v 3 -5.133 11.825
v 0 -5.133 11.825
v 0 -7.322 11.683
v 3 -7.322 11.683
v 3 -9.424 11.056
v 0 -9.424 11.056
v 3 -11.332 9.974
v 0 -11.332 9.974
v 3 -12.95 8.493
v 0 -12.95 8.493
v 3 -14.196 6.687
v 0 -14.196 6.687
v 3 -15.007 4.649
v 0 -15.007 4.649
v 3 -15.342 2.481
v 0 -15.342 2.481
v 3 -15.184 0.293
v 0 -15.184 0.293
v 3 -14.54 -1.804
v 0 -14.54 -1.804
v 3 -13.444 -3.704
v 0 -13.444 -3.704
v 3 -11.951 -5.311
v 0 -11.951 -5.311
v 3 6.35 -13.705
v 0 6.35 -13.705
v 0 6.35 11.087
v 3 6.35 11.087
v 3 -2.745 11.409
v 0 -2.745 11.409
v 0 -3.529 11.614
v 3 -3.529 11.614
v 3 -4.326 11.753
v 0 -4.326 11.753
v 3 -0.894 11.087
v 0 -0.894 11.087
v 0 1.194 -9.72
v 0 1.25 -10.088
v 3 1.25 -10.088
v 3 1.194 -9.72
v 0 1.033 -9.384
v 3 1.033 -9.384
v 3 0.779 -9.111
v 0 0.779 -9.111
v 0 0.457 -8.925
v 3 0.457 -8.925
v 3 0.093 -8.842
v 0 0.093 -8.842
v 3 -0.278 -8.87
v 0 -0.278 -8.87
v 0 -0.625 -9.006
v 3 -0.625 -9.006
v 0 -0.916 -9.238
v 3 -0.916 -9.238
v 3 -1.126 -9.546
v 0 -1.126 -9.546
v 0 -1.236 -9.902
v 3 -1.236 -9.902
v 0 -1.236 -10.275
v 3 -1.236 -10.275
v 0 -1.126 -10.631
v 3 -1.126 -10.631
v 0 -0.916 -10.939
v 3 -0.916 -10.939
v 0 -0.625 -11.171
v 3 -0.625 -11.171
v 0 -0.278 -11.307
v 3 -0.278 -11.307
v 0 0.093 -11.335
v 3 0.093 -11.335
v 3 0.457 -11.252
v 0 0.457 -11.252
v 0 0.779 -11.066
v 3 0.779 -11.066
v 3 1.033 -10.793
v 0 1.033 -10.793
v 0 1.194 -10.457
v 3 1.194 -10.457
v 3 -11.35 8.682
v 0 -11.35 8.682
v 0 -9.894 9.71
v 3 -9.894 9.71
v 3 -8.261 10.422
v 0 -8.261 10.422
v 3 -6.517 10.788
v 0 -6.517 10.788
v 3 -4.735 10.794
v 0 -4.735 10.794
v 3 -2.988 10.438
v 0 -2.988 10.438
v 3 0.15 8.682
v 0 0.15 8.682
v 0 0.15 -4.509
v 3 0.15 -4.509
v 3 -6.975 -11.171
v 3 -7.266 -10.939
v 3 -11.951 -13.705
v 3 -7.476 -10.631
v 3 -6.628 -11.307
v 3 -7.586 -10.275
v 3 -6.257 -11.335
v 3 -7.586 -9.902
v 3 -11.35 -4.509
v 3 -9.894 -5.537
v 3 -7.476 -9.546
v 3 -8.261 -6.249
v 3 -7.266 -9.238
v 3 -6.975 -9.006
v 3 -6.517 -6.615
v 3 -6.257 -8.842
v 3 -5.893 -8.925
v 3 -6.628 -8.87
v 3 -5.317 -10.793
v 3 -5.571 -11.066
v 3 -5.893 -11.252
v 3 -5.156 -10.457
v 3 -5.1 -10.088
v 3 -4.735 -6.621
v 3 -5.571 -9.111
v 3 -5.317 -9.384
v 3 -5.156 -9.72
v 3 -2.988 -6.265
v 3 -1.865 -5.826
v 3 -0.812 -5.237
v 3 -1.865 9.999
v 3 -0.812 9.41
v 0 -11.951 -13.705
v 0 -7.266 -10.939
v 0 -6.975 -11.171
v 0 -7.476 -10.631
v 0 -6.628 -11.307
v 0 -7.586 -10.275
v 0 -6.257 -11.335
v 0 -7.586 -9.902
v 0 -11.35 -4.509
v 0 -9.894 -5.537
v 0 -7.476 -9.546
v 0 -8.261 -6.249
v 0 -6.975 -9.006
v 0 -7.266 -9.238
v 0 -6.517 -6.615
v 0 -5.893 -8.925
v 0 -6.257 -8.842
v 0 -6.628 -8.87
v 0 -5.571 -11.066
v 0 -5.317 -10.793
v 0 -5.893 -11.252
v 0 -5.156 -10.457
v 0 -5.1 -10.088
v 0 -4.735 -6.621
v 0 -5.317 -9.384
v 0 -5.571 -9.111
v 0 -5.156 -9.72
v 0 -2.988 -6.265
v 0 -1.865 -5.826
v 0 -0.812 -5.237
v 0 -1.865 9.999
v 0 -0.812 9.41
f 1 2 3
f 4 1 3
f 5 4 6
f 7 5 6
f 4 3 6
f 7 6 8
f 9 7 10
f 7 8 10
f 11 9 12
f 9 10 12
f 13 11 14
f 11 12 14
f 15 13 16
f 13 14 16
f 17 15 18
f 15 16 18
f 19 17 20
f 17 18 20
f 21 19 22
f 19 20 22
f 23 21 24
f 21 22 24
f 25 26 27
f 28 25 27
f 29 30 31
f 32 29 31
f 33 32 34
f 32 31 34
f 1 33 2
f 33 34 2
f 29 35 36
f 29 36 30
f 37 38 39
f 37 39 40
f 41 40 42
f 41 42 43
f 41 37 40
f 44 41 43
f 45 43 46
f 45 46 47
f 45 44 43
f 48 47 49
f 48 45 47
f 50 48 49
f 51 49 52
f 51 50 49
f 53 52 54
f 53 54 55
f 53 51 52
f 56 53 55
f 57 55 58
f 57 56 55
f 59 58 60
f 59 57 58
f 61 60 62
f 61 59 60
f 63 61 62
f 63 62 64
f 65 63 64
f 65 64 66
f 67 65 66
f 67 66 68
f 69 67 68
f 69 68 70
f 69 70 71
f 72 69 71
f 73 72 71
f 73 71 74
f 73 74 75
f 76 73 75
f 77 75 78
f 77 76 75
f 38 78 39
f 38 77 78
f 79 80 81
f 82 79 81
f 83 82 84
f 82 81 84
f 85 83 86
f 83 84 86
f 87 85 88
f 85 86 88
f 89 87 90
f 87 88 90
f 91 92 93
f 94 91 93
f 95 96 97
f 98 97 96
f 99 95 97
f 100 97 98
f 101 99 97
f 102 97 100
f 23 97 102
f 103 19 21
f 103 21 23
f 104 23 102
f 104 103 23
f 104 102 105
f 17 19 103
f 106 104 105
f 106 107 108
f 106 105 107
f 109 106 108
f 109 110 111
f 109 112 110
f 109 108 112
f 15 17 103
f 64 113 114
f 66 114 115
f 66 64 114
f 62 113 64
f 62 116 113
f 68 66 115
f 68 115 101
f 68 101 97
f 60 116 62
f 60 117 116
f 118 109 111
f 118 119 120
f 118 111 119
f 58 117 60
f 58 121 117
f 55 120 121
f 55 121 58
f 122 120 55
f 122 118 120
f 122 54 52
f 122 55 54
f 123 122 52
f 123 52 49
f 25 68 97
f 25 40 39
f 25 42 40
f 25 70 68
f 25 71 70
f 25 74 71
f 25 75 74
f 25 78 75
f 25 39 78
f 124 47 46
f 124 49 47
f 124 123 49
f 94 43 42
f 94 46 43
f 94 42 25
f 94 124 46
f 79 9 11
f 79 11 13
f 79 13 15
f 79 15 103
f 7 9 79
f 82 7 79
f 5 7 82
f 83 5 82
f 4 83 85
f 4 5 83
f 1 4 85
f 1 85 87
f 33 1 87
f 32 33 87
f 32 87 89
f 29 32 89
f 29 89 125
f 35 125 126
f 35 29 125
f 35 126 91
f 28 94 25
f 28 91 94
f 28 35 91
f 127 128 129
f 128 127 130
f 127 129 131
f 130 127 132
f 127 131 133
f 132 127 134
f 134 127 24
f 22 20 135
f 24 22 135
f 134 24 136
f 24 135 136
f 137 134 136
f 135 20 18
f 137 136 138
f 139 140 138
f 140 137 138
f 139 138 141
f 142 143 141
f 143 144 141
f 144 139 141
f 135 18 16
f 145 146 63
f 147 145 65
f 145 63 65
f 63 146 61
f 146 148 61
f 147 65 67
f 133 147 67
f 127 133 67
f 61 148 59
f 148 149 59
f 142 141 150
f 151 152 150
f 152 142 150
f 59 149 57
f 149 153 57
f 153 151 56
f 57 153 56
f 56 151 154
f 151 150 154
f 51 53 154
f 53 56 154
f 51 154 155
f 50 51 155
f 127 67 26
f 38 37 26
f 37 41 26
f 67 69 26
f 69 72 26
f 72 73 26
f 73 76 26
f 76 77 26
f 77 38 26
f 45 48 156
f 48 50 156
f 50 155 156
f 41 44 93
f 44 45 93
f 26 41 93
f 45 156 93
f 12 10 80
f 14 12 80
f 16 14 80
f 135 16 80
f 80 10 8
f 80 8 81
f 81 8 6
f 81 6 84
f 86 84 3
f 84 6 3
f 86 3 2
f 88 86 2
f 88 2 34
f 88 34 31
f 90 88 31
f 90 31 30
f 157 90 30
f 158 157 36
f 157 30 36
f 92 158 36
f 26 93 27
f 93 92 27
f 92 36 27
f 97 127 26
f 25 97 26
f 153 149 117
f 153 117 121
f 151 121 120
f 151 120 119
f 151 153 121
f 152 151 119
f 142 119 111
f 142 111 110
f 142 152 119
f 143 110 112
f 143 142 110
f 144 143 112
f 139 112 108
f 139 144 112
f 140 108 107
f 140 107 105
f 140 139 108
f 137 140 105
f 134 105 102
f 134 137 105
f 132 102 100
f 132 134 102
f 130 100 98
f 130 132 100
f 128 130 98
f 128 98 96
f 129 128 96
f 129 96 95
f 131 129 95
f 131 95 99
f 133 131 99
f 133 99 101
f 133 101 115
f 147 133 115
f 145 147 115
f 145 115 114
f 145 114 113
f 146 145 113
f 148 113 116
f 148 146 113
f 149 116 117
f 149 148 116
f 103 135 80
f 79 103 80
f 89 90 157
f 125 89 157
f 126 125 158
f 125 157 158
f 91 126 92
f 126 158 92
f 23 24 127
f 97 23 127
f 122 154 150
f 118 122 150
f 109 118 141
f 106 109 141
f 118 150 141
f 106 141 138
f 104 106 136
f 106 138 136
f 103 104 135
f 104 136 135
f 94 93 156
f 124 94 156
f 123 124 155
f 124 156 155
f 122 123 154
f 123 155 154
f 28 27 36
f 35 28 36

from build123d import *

# Parameters (mm, degrees)
F0_R     = 1.25
F1_DEPTH = 3


with BuildPart() as f1:
    # F0 (on Right) → F1 (new body)
    with BuildSketch(Plane.YZ):
        with BuildLine():
            Line((-11.9511362031, -5.3111244172), (-11.9511362031, -13.7053132072))
            Line((-11.9511362031, -13.7053132072), (6.35, -13.7053132072))
            Line((6.35, -13.7053132072), (6.35, -6.9134512067))
            Line((6.35, -6.9134512067), (-0.8936743198, -6.9134512067))
            Line((-0.8936743198, -6.9134512067), (-2.7451495133, -7.2361294001))
            ThreePointArc((-2.7451495133, -7.2361294001), (-3.9259868399, -7.5186674947), (-5.1327843279, -7.6522503891))
            ThreePointArc((-5.1327843279, -7.6522503891), (-8.7662829798, -7.1350102989), (-11.9511362031, -5.3111244172))
        make_face()
        with Locations((-6.35, -10.0884512067)):
            Circle(F0_R, mode=Mode.SUBTRACT)
        with Locations((0, -10.0884512067)):
            Circle(F0_R, mode=Mode.SUBTRACT)
        with BuildLine():
            ThreePointArc((-5.1327843279, 11.8253479758), (-14.6592384736, 5.6910873598), (-11.9511362031, -5.3111244172))
            ThreePointArc((-11.9511362031, -5.3111244172), (-8.7662829798, -7.1350102989), (-5.1327843279, -7.6522503891))
            Line((-5.1327843279, -7.6522503891), (-2.7451495133, -7.2361294001))
            ThreePointArc((-2.7451495133, -7.2361294001), (-1.3343098737, -6.6807990238), (-0.0266257976, -5.9134512067))
            Line((-0.0266257976, -5.9134512067), (-2.9884921599, -6.2646503302))
            ThreePointArc((-2.9884921599, -6.2646503302), (-7.3981085591, -6.4767044208), (-11.35, -4.5089041858))
            ThreePointArc((-11.35, -4.5089041858), (-14.35, 2.0865487933), (-11.35, 8.6820017725))
            ThreePointArc((-11.35, 8.6820017725), (-7.3981085591, 10.6498020075), (-2.9884921599, 10.4377479169))
            Line((-2.9884921599, 10.4377479169), (-0.0266257976, 10.0865487933))
            ThreePointArc((-0.0266257976, 10.0865487933), (-1.3343098737, 10.8538966105), (-2.7451495133, 11.4092269868))
            Line((-2.7451495133, 11.4092269868), (-5.1327843279, 11.8253479758))
        make_face()
        with BuildLine():
            ThreePointArc((-2.7451495133, 11.4092269868), (-3.9259868399, 11.6917650813), (-5.1327843279, 11.8253479758))
            Line((-5.1327843279, 11.8253479758), (-2.7451495133, 11.4092269868))
        make_face()
        with BuildLine():
            Line((-0.8936743198, -6.9134512067), (6.35, -6.9134512067))
            Line((6.35, -6.9134512067), (6.35, -3.945808849))
            Line((6.35, -3.945808849), (5.35, -3.945808849))
            Line((5.35, -3.945808849), (5.35, -5.9134512067))
            Line((5.35, -5.9134512067), (-0.0266257976, -5.9134512067))
            ThreePointArc((-0.0266257976, -5.9134512067), (-1.3343098737, -6.6807990238), (-2.7451495133, -7.2361294001))
            Line((-2.7451495133, -7.2361294001), (-0.8936743198, -6.9134512067))
        make_face()
        with BuildLine():
            Line((-0.8936743198, 11.0865487933), (-2.7451495133, 11.4092269868))
            ThreePointArc((-2.7451495133, 11.4092269868), (-1.3343098737, 10.8538966105), (-0.0266257976, 10.0865487933))
            Line((-0.0266257976, 10.0865487933), (5.35, 10.0865487933))
            Line((5.35, 10.0865487933), (5.35, 8.1189064356))
            Line((5.35, 8.1189064356), (6.35, 8.1189064356))
            Line((6.35, 8.1189064356), (6.35, 11.0865487933))
            Line((6.35, 11.0865487933), (-0.8936743198, 11.0865487933))
        make_face()
        Polygon((5.35, -3.945808849), (6.35, -3.945808849), (6.35, 2.0865487933), (6.35, 8.1189064356), (5.35, 8.1189064356), (5.35, 2.0865487933), align=None)
        with BuildLine():
            ThreePointArc((4.15, 2.0865487933), (3.0430000137, 6.5988708965), (-0.0266257976, 10.0865487933))
            Line((-0.0266257976, 10.0865487933), (-2.9884921599, 10.4377479169))
            ThreePointArc((-2.9884921599, 10.4377479169), (-1.328072511, 9.7228525804), (0.15, 8.6820017725))
            ThreePointArc((0.15, 8.6820017725), (2.364766161, 5.7093929799), (3.15, 2.0865487933))
            ThreePointArc((3.15, 2.0865487933), (2.364766161, -1.5362953932), (0.15, -4.5089041858))
            ThreePointArc((0.15, -4.5089041858), (-1.328072511, -5.5497549938), (-2.9884921599, -6.2646503302))
            Line((-2.9884921599, -6.2646503302), (-0.0266257976, -5.9134512067))
            ThreePointArc((-0.0266257976, -5.9134512067), (3.0430000137, -2.4257733099), (4.15, 2.0865487933))
        make_face()
        with BuildLine():
            Line((5.35, 10.0865487933), (-0.0266257976, 10.0865487933))
            ThreePointArc((-0.0266257976, 10.0865487933), (3.0430000137, 6.5988708965), (4.15, 2.0865487933))
            ThreePointArc((4.15, 2.0865487933), (3.0430000137, -2.4257733099), (-0.0266257976, -5.9134512067))
            Line((-0.0266257976, -5.9134512067), (5.35, -5.9134512067))
            Line((5.35, -5.9134512067), (5.35, -3.945808849))
            Line((5.35, -3.945808849), (5.35, 2.0865487933))
            Line((5.35, 2.0865487933), (5.35, 8.1189064356))
            Line((5.35, 8.1189064356), (5.35, 10.0865487933))
        make_face()
        with BuildLine():
            Line((-11.35, -4.5089041858), (-11.35, 8.6820017725))
            ThreePointArc((-11.35, 8.6820017725), (-14.35, 2.0865487933), (-11.35, -4.5089041858))
        make_face()
        with BuildLine():
            ThreePointArc((3.15, 2.0865487933), (2.364766161, 5.7093929799), (0.15, 8.6820017725))
            Line((0.15, 8.6820017725), (0.15, -4.5089041858))
            ThreePointArc((0.15, -4.5089041858), (2.364766161, -1.5362953932), (3.15, 2.0865487933))
        make_face()
        with BuildLine():
            Line((-2.7451495133, -7.2361294001), (-5.1327843279, -7.6522503891))
            ThreePointArc((-5.1327843279, -7.6522503891), (-3.9259868399, -7.5186674947), (-2.7451495133, -7.2361294001))
        make_face()
    extrude(amount=F1_DEPTH)


solid = f1.part
